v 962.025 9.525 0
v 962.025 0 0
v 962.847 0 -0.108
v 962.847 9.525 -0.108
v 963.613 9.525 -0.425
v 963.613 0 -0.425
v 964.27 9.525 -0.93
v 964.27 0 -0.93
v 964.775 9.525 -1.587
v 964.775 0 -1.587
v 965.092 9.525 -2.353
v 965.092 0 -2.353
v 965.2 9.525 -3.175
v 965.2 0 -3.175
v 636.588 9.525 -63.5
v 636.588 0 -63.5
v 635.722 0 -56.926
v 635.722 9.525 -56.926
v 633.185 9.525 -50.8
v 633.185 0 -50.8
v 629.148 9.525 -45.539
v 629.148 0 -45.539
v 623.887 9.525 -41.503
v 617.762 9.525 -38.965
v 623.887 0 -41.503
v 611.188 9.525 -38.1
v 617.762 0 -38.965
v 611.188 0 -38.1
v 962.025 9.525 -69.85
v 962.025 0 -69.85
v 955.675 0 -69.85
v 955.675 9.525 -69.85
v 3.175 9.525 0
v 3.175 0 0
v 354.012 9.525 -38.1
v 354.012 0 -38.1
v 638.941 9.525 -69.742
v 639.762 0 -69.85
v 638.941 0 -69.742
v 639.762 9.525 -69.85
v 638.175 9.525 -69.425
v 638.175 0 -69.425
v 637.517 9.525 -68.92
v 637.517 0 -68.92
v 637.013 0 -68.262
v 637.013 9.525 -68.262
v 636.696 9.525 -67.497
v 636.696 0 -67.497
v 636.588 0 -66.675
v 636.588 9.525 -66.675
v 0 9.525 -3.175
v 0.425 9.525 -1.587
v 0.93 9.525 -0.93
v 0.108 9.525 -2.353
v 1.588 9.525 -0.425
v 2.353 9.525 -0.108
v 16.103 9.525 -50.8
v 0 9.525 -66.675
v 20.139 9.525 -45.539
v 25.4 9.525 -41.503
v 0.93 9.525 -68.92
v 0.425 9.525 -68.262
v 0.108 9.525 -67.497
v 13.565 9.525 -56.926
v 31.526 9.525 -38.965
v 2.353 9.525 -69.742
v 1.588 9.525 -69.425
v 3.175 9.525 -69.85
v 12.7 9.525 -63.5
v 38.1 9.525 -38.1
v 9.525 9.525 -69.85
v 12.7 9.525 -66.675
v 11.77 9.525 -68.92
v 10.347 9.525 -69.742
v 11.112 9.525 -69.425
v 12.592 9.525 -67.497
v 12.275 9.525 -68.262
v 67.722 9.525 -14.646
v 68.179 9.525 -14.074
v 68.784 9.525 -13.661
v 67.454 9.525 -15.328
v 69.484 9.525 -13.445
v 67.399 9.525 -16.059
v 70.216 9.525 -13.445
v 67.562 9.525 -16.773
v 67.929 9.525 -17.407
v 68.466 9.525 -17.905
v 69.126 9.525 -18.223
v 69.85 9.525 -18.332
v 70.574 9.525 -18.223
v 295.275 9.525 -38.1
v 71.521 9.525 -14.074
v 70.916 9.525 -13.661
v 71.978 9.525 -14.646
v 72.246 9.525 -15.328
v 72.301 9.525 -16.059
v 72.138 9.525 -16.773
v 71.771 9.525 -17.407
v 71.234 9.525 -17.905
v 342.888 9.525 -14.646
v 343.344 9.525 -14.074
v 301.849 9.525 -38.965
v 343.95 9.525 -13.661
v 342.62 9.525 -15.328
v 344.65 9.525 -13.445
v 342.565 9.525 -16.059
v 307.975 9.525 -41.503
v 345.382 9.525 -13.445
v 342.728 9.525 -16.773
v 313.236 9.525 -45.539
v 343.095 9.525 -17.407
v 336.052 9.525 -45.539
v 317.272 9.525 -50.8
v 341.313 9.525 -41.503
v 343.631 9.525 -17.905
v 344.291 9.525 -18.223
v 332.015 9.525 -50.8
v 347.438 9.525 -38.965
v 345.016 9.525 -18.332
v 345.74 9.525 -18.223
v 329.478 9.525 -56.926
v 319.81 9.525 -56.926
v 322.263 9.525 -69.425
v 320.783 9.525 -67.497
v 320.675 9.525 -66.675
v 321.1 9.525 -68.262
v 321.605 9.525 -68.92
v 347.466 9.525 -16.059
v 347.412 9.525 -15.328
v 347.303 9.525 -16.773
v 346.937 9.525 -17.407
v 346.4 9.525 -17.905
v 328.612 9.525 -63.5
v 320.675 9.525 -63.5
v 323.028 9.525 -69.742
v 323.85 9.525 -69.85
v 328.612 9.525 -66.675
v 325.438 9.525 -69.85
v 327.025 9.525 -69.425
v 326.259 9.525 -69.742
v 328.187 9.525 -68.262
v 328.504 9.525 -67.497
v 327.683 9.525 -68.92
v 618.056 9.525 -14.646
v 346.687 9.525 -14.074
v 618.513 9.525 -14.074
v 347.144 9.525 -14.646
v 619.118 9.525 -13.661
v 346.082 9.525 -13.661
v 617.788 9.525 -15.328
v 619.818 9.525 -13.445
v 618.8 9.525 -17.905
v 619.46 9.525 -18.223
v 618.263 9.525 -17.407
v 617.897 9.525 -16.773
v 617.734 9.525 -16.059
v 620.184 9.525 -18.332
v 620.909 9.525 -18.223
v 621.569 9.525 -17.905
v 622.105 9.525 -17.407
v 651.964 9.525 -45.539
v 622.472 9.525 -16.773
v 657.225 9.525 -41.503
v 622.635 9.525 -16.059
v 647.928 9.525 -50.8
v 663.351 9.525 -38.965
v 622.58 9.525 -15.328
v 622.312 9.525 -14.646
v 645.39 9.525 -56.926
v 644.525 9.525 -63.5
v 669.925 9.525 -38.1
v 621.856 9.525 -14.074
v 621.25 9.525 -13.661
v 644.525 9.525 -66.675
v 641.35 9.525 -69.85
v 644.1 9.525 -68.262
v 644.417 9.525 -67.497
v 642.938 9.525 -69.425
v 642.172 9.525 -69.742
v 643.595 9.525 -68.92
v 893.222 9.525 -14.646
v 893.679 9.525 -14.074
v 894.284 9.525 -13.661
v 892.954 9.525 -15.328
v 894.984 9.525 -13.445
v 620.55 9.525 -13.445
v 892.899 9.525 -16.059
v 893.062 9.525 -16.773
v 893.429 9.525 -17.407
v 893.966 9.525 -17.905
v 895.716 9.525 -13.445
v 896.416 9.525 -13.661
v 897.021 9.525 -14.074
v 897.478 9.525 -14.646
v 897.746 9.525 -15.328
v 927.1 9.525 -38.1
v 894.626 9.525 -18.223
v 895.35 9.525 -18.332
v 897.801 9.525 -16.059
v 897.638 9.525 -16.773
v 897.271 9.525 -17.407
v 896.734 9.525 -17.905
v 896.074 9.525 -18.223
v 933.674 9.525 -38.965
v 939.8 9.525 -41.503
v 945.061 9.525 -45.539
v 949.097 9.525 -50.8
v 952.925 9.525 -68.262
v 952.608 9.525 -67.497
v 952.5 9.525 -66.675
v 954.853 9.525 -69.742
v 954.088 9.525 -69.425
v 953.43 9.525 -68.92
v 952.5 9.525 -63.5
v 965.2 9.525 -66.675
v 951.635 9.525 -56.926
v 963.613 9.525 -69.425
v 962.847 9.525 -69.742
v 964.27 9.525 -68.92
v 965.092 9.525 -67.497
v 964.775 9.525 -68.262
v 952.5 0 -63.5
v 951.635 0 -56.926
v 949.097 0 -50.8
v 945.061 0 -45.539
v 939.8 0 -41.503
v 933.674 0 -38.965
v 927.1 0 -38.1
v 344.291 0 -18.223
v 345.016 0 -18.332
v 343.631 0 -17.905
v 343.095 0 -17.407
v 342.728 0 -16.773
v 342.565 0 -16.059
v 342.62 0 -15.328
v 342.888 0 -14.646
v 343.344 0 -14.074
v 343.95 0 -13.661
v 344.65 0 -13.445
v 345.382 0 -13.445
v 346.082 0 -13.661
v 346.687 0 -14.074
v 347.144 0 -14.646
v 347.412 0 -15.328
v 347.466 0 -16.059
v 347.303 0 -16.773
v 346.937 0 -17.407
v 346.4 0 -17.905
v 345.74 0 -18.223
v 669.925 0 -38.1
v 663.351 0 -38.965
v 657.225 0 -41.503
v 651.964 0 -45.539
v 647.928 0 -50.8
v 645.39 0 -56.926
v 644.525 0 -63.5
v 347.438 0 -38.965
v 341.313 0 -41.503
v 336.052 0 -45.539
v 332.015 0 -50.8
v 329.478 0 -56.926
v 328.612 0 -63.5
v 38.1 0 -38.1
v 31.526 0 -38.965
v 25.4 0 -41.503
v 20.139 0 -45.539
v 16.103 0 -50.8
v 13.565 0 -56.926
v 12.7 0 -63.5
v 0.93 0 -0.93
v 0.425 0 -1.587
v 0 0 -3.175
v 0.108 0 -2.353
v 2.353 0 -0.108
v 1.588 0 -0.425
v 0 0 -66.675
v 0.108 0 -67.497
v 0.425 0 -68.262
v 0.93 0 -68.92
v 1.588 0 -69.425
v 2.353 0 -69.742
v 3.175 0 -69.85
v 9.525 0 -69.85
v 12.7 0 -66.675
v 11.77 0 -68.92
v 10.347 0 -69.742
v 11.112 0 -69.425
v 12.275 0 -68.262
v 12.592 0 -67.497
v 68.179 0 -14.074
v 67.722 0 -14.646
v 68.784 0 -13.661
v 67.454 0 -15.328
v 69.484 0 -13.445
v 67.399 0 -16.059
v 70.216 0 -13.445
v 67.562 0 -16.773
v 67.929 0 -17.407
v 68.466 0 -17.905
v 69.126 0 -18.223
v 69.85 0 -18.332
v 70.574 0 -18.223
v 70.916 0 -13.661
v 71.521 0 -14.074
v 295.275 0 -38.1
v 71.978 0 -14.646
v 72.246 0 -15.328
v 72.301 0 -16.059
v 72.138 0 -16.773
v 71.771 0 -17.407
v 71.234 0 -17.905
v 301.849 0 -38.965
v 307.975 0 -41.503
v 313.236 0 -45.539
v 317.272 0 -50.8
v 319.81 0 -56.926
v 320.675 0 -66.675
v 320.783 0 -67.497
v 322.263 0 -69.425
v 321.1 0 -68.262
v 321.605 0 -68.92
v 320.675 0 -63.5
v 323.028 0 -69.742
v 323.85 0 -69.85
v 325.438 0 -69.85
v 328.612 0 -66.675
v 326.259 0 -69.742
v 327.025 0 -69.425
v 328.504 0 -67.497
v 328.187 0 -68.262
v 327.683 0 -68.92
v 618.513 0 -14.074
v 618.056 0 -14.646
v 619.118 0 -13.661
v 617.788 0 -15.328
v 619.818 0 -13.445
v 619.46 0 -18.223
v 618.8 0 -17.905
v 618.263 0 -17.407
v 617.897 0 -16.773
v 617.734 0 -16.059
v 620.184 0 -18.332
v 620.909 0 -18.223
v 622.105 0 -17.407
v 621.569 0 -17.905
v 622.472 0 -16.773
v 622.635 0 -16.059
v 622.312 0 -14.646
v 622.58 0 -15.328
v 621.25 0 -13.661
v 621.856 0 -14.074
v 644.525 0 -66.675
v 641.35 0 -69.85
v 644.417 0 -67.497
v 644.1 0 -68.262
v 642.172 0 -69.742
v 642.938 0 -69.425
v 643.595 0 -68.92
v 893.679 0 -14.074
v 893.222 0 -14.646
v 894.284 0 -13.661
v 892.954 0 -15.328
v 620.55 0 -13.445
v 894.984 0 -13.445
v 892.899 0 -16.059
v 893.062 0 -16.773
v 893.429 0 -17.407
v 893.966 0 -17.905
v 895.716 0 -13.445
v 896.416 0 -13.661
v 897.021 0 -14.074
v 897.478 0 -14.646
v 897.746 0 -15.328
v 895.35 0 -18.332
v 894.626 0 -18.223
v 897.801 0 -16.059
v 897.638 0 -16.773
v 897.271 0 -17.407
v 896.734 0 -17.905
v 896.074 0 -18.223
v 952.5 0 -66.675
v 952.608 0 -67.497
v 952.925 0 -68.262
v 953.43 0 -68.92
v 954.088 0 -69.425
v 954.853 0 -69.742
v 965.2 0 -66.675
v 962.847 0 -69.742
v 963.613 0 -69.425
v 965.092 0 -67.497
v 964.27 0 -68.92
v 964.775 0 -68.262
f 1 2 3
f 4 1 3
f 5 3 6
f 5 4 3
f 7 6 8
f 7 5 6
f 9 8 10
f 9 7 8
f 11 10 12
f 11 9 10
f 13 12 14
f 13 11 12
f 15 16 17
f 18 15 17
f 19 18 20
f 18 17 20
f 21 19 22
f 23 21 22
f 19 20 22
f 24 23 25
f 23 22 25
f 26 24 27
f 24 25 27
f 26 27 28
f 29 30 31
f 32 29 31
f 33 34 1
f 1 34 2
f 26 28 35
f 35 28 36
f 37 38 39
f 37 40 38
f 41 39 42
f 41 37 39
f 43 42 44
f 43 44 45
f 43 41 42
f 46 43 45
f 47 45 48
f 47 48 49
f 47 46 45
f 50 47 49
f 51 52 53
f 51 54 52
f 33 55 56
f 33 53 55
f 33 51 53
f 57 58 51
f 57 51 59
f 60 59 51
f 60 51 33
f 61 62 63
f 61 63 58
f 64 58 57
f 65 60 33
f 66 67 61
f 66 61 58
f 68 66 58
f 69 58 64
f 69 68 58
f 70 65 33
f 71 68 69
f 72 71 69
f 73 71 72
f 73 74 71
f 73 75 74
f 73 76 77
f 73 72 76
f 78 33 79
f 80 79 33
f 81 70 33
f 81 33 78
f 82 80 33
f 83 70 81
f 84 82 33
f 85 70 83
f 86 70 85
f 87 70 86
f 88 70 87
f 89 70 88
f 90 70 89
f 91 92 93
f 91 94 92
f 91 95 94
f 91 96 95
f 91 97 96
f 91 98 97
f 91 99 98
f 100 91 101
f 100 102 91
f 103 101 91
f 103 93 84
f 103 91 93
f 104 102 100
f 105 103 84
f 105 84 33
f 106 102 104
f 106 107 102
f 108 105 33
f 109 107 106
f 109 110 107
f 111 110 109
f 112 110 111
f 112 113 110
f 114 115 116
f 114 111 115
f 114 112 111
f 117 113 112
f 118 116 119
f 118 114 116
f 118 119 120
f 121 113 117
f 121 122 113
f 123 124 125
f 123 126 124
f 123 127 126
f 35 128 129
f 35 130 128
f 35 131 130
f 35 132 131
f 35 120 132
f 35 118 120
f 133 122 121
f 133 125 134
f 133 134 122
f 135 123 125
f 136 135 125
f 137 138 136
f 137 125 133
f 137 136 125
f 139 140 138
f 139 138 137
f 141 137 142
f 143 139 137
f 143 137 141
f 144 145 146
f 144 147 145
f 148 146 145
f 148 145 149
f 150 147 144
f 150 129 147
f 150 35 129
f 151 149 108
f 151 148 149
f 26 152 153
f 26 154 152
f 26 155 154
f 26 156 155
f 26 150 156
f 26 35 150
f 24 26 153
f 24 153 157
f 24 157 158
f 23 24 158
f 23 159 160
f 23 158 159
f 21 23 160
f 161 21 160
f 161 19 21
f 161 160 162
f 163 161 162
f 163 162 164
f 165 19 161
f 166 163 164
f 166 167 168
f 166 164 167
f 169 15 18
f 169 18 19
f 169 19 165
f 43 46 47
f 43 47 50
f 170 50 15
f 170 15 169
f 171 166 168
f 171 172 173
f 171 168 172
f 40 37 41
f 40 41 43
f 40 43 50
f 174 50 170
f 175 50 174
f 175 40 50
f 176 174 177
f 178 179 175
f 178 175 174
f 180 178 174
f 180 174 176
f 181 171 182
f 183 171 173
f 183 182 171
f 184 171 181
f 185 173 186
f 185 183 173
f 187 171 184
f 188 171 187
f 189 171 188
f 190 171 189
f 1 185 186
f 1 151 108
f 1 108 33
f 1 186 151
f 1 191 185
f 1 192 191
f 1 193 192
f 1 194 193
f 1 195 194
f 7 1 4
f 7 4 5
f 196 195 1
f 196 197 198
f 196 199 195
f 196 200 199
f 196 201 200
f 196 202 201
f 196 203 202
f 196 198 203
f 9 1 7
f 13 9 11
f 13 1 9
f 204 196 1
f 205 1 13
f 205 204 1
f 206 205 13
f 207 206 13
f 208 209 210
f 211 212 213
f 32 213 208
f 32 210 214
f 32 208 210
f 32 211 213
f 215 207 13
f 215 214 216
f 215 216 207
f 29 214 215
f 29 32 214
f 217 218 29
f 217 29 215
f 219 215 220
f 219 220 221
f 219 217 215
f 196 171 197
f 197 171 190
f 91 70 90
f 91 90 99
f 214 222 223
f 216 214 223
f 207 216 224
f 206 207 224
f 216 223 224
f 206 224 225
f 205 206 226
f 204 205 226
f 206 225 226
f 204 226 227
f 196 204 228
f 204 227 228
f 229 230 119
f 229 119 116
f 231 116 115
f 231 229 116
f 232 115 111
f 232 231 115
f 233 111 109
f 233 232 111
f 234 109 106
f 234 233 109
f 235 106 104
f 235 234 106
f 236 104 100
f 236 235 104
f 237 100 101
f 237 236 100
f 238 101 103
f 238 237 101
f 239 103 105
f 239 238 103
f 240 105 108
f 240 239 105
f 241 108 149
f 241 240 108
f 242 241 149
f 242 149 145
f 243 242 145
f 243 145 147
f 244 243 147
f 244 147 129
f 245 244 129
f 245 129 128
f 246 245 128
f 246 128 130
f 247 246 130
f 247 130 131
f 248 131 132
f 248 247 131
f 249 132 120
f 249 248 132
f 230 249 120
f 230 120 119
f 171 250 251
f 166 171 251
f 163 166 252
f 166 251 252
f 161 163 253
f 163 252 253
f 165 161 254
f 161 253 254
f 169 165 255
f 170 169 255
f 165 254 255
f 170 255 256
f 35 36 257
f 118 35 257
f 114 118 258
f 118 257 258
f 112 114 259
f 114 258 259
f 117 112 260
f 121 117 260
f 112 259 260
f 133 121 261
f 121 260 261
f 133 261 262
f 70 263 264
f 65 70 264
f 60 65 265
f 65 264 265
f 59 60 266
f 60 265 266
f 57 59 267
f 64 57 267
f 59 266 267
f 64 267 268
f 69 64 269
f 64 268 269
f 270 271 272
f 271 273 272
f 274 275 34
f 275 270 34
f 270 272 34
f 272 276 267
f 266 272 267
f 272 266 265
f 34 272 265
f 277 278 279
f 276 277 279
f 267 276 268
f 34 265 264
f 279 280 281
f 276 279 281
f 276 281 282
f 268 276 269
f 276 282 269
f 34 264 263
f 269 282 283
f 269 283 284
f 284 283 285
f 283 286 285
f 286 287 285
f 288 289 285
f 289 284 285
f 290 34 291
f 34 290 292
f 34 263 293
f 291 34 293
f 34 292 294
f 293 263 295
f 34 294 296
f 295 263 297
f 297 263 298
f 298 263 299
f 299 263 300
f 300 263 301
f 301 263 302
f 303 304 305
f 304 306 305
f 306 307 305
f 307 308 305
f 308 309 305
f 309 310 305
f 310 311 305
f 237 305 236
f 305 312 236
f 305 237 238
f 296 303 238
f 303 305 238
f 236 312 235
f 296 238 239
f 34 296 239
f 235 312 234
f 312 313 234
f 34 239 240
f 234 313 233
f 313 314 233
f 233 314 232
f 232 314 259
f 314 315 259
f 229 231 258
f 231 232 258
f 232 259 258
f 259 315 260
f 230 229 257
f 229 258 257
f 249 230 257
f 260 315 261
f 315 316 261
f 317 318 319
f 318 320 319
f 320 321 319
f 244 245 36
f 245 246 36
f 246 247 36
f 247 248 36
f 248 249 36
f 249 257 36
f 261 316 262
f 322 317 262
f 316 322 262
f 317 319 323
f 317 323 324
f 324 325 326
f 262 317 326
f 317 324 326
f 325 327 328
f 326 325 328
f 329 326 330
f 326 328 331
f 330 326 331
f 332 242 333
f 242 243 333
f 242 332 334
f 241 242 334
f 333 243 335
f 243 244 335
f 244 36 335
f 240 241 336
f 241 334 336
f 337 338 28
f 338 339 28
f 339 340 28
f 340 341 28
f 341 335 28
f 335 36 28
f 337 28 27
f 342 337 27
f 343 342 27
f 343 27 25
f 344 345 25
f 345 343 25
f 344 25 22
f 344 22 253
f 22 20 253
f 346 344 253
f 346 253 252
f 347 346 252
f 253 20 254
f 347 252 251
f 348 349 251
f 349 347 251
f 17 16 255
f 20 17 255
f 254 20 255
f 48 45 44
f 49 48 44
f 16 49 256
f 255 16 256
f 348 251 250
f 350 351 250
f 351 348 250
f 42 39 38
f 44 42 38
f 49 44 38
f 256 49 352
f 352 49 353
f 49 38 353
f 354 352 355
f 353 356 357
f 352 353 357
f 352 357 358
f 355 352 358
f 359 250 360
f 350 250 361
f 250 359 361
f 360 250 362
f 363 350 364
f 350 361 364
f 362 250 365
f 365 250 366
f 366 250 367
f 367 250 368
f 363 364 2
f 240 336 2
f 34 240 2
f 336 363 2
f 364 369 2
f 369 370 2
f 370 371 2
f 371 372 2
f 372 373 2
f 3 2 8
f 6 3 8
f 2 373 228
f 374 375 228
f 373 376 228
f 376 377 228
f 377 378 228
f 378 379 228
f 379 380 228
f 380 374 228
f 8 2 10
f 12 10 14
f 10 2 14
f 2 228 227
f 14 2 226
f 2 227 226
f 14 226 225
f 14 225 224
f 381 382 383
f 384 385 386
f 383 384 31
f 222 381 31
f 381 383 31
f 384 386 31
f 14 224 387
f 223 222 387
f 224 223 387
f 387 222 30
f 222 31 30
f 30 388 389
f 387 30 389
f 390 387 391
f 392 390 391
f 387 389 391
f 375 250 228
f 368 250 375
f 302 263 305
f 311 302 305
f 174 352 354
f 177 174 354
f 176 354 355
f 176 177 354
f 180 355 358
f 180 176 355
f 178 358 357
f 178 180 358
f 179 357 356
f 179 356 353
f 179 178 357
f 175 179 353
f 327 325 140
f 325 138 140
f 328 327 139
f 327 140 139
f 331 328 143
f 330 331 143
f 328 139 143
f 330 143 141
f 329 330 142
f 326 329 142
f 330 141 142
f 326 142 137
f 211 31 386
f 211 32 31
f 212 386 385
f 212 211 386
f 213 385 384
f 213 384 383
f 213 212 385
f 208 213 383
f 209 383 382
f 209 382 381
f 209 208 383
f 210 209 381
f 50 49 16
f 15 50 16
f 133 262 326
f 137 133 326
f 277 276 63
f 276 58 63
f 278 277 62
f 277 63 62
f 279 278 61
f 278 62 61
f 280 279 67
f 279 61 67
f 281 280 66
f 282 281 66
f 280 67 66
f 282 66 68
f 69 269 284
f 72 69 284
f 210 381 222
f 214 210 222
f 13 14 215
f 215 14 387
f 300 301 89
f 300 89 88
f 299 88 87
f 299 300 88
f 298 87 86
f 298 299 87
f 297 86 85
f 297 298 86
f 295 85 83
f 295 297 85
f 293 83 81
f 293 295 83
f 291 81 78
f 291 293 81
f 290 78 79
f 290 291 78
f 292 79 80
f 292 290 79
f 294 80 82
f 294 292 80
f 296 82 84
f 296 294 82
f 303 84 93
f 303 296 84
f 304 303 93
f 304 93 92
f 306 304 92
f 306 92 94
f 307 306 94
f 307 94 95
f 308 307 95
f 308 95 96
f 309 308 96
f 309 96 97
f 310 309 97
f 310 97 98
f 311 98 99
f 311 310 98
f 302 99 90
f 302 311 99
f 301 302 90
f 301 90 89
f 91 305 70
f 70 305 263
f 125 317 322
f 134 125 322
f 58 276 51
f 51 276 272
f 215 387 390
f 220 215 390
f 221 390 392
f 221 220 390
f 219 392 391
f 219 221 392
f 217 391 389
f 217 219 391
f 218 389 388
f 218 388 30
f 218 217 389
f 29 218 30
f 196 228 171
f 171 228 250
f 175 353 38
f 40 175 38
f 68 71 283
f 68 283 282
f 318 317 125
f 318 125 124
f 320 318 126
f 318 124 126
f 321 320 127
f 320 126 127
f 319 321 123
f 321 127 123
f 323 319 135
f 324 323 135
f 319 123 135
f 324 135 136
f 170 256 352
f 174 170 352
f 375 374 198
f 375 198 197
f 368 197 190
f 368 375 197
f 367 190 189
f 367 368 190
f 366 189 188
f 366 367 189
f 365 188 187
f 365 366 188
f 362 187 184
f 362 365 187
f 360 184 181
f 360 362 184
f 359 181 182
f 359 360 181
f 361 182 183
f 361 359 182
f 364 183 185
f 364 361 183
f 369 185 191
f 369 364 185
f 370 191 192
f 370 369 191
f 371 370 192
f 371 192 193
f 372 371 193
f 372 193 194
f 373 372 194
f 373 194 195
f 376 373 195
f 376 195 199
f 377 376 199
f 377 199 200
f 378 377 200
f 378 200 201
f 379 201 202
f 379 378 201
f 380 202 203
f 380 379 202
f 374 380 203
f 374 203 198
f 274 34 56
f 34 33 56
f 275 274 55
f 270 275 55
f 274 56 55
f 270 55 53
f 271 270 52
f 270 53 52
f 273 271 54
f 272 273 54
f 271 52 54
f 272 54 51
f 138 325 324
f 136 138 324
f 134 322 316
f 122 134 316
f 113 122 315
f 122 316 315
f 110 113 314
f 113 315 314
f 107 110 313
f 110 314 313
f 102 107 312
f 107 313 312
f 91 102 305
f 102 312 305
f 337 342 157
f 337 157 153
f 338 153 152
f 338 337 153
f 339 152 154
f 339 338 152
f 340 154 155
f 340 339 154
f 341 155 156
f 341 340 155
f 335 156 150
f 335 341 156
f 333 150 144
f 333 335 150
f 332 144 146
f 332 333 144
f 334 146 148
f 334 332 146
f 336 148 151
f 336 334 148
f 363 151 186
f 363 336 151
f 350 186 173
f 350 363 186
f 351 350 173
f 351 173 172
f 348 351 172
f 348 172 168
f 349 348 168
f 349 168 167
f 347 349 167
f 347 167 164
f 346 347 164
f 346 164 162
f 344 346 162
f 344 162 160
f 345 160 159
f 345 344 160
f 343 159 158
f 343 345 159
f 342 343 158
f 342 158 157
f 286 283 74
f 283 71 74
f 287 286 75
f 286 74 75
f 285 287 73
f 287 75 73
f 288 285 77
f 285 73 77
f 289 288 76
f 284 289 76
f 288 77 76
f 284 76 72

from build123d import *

# Parameters (mm, degrees)
SKETCH1_R           = 2.45745
BOSS_EXTRUDE1_DEPTH = 9.525
FILLET1_R           = 3.175


with BuildPart() as part:
    # Sketch1 → Boss-Extrude1 (new body)
    with BuildSketch(Plane(origin=(0, 0, 0), x_dir=(1, 0, 0), z_dir=(0, 1, 0))):
        with BuildLine():
            Line((0, 0), (965.2, 0))
            Line((965.2, 0), (965.2, 69.85))
            Line((965.2, 69.85), (952.5, 69.85))
            Line((952.5, 69.85), (952.5, 63.5))
            ThreePointArc((952.5, 63.5), (945.060512242, 45.539487758), (927.1, 38.1))
            Line((927.1, 38.1), (669.925, 38.1))
            ThreePointArc((669.925, 38.1), (651.964487758, 45.539487758), (644.525, 63.5))
            Line((644.525, 63.5), (644.525, 69.85))
            Line((644.525, 69.85), (636.5875, 69.85))
            Line((636.5875, 69.85), (636.5875, 63.5))
            ThreePointArc((636.5875, 63.5), (629.148012242, 45.539487758), (611.1875, 38.1))
            Line((611.1875, 38.1), (354.0125, 38.1))
            ThreePointArc((354.0125, 38.1), (336.051987758, 45.539487758), (328.6125, 63.5))
            Line((328.6125, 63.5), (328.6125, 69.85))
            Line((328.6125, 69.85), (320.675, 69.85))
            Line((320.675, 69.85), (320.675, 63.5))
            ThreePointArc((320.675, 63.5), (313.235512242, 45.539487758), (295.275, 38.1))
            Line((295.275, 38.1), (38.1, 38.1))
            ThreePointArc((38.1, 38.1), (20.139487758, 45.539487758), (12.7, 63.5))
            Line((12.7, 63.5), (12.7, 69.85))
            Line((12.7, 69.85), (0, 69.85))
            Line((0, 69.85), (0, 0))
        make_face()
        with Locations(Location((69.85, 15.875, 0), (0, 0, 90))):
            Circle(SKETCH1_R, mode=Mode.SUBTRACT)
        with Locations(Location((345.01582, 15.875, 0), (0, 0, 90))):
            Circle(SKETCH1_R, mode=Mode.SUBTRACT)
        with Locations(Location((895.35, 15.875, 0), (0, 0, 90))):
            Circle(SKETCH1_R, mode=Mode.SUBTRACT)
        with Locations(Location((620.18418, 15.875, 0), (0, 0, 90))):
            Circle(SKETCH1_R, mode=Mode.SUBTRACT)
    extrude(amount=BOSS_EXTRUDE1_DEPTH)

    # Fillet1
    fillet1_edges = [part.edges().sort_by_distance(p)[0] for p in [
        (0, 4.7625, -69.85),
        (12.7, 4.7625, -69.85),
        (320.675, 4.7625, -69.85),
        (328.6125, 4.7625, -69.85),
        (636.5875, 4.7625, -69.85),
        (644.525, 4.7625, -69.85),
        (952.5, 4.7625, -69.85),
        (965.2, 4.7625, -69.85),
        (965.2, 4.7625, 0),
        (0, 4.7625, 0),
    ]]
    fillet(fillet1_edges, radius=FILLET1_R)


solid = part.part
